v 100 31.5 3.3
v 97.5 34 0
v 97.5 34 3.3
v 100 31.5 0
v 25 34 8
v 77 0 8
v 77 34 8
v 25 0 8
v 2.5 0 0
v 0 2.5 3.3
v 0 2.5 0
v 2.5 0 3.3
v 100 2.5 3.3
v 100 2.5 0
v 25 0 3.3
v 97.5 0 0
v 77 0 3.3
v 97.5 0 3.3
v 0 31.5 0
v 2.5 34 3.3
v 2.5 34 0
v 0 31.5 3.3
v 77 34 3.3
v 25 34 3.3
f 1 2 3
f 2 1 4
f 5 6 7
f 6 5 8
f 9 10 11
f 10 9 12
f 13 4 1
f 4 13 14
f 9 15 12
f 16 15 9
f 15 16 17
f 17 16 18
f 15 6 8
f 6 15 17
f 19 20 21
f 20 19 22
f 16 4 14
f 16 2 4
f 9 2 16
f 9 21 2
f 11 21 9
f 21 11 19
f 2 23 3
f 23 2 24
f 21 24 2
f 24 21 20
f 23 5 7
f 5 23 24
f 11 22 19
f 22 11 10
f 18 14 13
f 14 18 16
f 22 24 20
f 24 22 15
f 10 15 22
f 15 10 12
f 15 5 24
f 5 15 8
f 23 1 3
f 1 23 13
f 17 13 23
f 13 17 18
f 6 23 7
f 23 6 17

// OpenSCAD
$fn = 32;

// ----------------------------------------------------------------------
// Stepped bar: centerstep, 100 x 34 x 8/3.3 mm
// ----------------------------------------------------------------------

// --- parameters (mm) ---
bar_l = 100;              // bar length, X
bar_w = 34;               // bar width, Y
plate_t = 8;              // thickness of the thick zone, Z
thin_t = 3.3;             // thickness of the thin zone
corner_c = 2.5;           // corner chamfer of the bar
step_cut = 4.7;           // material removed from the thin zone
thick_from = 25;          // start of the thick middle zone
thick_to = 77;            // end of the thick middle zone
depth_1 = 4.7;            // depth of cut 1 from the top face
depth_2 = 4.7;            // depth of cut 2 from the top face

profile = [[2.5, 0], [97.5, 0], [100, 2.5], [100, 31.5], [97.5, 34], [2.5, 34], [0, 31.5], [0, 2.5]];  // primary outline, 8 points, counter clockwise
void_1 = [[-1, -1], [25, -1], [25, 35], [-1, 35]];  // thin left end, 4 points
void_2 = [[77, -1], [101, -1], [101, 35], [77, 35]];  // thin right end, 4 points

// --- the one profile operation ---
difference() {
  linear_extrude(height = plate_t) polygon(points = profile);
  translate([0, 0, plate_t - depth_1])
    linear_extrude(height = depth_1 + 1) polygon(points = void_1);
  translate([0, 0, plate_t - depth_2])
    linear_extrude(height = depth_2 + 1) polygon(points = void_2);
}
